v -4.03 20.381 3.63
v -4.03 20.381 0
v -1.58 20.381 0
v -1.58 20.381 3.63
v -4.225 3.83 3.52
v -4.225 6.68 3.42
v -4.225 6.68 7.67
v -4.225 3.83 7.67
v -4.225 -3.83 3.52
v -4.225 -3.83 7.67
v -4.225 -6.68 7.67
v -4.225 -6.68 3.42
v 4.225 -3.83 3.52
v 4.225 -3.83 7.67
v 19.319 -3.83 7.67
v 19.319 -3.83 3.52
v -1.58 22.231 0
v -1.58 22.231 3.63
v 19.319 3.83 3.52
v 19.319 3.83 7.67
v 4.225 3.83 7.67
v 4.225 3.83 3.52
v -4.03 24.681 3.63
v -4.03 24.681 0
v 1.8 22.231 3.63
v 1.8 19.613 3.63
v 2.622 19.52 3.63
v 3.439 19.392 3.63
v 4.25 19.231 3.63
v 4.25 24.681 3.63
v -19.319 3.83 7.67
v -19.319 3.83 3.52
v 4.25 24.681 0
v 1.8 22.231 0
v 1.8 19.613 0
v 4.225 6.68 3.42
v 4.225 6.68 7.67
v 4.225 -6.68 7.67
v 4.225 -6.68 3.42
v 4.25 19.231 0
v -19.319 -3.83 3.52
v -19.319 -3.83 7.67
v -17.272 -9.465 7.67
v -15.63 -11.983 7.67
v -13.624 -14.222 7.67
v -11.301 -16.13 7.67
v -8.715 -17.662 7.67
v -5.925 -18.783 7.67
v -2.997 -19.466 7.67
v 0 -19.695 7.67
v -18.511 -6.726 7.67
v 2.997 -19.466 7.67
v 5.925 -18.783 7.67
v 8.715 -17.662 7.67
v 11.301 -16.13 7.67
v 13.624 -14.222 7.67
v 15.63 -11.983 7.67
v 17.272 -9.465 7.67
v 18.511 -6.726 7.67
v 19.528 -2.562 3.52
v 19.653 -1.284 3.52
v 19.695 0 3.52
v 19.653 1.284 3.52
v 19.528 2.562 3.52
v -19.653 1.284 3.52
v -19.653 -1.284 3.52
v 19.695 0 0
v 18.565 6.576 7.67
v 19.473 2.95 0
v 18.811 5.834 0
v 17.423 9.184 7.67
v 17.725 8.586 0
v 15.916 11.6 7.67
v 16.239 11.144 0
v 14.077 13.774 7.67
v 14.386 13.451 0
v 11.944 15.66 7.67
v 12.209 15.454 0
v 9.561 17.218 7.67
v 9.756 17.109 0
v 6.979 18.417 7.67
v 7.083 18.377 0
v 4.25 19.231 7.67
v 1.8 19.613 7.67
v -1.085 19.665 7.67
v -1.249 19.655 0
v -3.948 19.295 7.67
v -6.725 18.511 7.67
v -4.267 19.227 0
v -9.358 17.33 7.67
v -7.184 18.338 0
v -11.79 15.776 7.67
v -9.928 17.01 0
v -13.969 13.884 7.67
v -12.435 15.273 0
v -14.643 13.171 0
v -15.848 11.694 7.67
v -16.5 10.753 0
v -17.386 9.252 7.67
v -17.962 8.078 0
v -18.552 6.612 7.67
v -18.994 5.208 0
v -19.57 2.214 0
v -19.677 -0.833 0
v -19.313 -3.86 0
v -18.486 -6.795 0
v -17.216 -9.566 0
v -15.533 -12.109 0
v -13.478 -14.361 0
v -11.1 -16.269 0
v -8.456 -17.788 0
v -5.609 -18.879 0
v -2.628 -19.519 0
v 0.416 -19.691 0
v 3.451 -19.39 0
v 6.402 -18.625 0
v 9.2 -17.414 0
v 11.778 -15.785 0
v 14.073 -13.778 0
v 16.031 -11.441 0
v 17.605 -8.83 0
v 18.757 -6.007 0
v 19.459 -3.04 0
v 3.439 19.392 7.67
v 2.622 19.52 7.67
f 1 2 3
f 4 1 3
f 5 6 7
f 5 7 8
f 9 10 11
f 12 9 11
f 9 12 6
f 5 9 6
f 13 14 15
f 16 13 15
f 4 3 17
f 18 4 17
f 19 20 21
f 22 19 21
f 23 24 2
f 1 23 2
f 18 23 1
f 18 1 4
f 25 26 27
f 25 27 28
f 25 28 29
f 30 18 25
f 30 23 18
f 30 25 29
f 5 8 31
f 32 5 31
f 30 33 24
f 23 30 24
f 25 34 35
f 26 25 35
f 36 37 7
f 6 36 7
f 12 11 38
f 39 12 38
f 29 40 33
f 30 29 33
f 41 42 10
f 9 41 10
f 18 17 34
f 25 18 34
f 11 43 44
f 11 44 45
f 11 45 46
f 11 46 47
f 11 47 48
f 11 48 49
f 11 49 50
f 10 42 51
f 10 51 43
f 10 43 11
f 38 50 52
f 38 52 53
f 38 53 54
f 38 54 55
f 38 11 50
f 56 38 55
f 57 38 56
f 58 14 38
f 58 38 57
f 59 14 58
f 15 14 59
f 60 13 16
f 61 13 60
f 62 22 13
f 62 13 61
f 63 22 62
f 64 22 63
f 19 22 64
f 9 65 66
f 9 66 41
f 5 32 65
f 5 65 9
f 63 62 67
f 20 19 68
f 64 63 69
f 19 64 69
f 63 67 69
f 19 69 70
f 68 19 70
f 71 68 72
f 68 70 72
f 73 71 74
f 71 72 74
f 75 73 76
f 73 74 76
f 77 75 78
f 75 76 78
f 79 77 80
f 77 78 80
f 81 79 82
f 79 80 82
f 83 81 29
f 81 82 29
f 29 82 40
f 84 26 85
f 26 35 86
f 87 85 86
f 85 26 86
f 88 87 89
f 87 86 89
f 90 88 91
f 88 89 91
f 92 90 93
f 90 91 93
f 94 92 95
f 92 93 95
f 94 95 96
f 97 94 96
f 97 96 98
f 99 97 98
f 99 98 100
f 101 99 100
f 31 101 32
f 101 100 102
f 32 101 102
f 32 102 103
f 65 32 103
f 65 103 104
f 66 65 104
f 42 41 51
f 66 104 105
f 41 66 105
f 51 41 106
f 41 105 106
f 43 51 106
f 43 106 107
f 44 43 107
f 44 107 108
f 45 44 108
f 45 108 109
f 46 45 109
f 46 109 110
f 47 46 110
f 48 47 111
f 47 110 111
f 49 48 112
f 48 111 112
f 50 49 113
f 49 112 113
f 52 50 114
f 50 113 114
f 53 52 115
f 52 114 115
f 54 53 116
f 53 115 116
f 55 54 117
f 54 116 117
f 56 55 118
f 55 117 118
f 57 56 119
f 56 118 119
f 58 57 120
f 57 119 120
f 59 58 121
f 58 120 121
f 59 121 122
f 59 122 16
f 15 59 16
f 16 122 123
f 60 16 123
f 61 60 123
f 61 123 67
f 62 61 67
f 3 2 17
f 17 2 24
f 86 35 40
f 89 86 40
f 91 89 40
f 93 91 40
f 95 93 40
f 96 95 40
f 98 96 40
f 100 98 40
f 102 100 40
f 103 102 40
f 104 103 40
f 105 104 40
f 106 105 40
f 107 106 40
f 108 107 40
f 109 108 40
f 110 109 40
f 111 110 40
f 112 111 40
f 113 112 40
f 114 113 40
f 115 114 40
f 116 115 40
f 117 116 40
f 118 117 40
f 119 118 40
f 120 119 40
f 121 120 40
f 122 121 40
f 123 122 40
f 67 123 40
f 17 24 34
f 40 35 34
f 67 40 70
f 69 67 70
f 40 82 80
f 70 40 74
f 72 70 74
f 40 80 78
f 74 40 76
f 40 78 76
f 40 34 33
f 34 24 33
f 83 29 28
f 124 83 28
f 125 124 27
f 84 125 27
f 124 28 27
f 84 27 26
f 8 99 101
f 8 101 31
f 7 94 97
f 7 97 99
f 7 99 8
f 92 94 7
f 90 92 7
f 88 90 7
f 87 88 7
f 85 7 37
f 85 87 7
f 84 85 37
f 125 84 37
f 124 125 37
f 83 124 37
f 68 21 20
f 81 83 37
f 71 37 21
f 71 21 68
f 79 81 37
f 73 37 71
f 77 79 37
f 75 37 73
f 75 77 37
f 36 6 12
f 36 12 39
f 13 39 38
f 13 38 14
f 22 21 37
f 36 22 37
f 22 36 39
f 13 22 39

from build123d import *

# Parameters (mm, degrees)
F1_DEPTH = 7.67
F2_DEPTH = 3.63
F4_DEPTH = 4.25
F5_DEPTH = 4.15


with BuildPart() as f1:
    # F0 (on Top) → F1 (new body)
    with BuildSketch(Plane.XY):
        with BuildLine():
            ThreePointArc((1.8, 19.6125731356), (-14.5489522819, -13.27482627), (19.695, 0))
            ThreePointArc((19.695, 0), (15.3557281657, 12.3326654662), (4.25, 19.2309782642))
            ThreePointArc((4.25, 19.2309782642), (3.0310111616, 19.4603698921), (1.8, 19.6125731356))
        make_face()
    extrude(amount=F1_DEPTH)

    # F0 (on Top) → F2 (join)
    with BuildSketch(Plane.XY):
        with BuildLine():
            ThreePointArc((1.8, 19.6125731356), (3.0310111616, 19.4603698921), (4.25, 19.2309782642))
            Line((4.25, 19.2309782642), (4.25, 24.6809782642))
            Line((4.25, 24.6809782642), (-4.03, 24.6809782642))
            Line((-4.03, 24.6809782642), (-4.03, 20.3809782642))
            Line((-4.03, 20.3809782642), (-1.58, 20.3809782642))
            Line((-1.58, 20.3809782642), (-1.58, 22.2309782642))
            Line((-1.58, 22.2309782642), (1.8, 22.2309782642))
            Line((1.8, 22.2309782642), (1.8, 19.6125731356))
        make_face()
    extrude(amount=F2_DEPTH)

    # F3 (on face) → F4 (cut)
    with BuildSketch(Plane.XY.offset(7.67)):
        Polygon((4.2250477709, 3.83), (4.2250477709, 6.68), (-4.2250477709, 6.68), (-4.2250477709, 3.83), (-4.2250477709, -3.83), (-4.2250477709, -6.68), (4.2250477709, -6.68), (4.2250477709, -3.83), align=None)
    extrude(amount=-F4_DEPTH, mode=Mode.SUBTRACT)

    # F3 (on face) → F5 (cut)
    with BuildSketch(Plane.XY.offset(7.67)):
        with BuildLine():
            Line((-4.2250477709, -3.83), (-4.2250477709, 3.83))
            Line((-4.2250477709, 3.83), (-19.3190094208, 3.83))
            ThreePointArc((-19.3190094208, 3.83), (-19.695, 0), (-19.3190094208, -3.83))
            Line((-19.3190094208, -3.83), (-4.2250477709, -3.83))
        make_face()
        with BuildLine():
            Line((19.3190094208, 3.83), (4.2250477709, 3.83))
            Line((4.2250477709, 3.83), (4.2250477709, -3.83))
            Line((4.2250477709, -3.83), (19.3190094208, -3.83))
            ThreePointArc((19.3190094208, -3.83), (19.6007769686, -1.9242056098), (19.695, 0))
            ThreePointArc((19.695, 0), (19.6007769686, 1.9242056098), (19.3190094208, 3.83))
        make_face()
    extrude(amount=-F5_DEPTH, mode=Mode.SUBTRACT)


solid = f1.part
